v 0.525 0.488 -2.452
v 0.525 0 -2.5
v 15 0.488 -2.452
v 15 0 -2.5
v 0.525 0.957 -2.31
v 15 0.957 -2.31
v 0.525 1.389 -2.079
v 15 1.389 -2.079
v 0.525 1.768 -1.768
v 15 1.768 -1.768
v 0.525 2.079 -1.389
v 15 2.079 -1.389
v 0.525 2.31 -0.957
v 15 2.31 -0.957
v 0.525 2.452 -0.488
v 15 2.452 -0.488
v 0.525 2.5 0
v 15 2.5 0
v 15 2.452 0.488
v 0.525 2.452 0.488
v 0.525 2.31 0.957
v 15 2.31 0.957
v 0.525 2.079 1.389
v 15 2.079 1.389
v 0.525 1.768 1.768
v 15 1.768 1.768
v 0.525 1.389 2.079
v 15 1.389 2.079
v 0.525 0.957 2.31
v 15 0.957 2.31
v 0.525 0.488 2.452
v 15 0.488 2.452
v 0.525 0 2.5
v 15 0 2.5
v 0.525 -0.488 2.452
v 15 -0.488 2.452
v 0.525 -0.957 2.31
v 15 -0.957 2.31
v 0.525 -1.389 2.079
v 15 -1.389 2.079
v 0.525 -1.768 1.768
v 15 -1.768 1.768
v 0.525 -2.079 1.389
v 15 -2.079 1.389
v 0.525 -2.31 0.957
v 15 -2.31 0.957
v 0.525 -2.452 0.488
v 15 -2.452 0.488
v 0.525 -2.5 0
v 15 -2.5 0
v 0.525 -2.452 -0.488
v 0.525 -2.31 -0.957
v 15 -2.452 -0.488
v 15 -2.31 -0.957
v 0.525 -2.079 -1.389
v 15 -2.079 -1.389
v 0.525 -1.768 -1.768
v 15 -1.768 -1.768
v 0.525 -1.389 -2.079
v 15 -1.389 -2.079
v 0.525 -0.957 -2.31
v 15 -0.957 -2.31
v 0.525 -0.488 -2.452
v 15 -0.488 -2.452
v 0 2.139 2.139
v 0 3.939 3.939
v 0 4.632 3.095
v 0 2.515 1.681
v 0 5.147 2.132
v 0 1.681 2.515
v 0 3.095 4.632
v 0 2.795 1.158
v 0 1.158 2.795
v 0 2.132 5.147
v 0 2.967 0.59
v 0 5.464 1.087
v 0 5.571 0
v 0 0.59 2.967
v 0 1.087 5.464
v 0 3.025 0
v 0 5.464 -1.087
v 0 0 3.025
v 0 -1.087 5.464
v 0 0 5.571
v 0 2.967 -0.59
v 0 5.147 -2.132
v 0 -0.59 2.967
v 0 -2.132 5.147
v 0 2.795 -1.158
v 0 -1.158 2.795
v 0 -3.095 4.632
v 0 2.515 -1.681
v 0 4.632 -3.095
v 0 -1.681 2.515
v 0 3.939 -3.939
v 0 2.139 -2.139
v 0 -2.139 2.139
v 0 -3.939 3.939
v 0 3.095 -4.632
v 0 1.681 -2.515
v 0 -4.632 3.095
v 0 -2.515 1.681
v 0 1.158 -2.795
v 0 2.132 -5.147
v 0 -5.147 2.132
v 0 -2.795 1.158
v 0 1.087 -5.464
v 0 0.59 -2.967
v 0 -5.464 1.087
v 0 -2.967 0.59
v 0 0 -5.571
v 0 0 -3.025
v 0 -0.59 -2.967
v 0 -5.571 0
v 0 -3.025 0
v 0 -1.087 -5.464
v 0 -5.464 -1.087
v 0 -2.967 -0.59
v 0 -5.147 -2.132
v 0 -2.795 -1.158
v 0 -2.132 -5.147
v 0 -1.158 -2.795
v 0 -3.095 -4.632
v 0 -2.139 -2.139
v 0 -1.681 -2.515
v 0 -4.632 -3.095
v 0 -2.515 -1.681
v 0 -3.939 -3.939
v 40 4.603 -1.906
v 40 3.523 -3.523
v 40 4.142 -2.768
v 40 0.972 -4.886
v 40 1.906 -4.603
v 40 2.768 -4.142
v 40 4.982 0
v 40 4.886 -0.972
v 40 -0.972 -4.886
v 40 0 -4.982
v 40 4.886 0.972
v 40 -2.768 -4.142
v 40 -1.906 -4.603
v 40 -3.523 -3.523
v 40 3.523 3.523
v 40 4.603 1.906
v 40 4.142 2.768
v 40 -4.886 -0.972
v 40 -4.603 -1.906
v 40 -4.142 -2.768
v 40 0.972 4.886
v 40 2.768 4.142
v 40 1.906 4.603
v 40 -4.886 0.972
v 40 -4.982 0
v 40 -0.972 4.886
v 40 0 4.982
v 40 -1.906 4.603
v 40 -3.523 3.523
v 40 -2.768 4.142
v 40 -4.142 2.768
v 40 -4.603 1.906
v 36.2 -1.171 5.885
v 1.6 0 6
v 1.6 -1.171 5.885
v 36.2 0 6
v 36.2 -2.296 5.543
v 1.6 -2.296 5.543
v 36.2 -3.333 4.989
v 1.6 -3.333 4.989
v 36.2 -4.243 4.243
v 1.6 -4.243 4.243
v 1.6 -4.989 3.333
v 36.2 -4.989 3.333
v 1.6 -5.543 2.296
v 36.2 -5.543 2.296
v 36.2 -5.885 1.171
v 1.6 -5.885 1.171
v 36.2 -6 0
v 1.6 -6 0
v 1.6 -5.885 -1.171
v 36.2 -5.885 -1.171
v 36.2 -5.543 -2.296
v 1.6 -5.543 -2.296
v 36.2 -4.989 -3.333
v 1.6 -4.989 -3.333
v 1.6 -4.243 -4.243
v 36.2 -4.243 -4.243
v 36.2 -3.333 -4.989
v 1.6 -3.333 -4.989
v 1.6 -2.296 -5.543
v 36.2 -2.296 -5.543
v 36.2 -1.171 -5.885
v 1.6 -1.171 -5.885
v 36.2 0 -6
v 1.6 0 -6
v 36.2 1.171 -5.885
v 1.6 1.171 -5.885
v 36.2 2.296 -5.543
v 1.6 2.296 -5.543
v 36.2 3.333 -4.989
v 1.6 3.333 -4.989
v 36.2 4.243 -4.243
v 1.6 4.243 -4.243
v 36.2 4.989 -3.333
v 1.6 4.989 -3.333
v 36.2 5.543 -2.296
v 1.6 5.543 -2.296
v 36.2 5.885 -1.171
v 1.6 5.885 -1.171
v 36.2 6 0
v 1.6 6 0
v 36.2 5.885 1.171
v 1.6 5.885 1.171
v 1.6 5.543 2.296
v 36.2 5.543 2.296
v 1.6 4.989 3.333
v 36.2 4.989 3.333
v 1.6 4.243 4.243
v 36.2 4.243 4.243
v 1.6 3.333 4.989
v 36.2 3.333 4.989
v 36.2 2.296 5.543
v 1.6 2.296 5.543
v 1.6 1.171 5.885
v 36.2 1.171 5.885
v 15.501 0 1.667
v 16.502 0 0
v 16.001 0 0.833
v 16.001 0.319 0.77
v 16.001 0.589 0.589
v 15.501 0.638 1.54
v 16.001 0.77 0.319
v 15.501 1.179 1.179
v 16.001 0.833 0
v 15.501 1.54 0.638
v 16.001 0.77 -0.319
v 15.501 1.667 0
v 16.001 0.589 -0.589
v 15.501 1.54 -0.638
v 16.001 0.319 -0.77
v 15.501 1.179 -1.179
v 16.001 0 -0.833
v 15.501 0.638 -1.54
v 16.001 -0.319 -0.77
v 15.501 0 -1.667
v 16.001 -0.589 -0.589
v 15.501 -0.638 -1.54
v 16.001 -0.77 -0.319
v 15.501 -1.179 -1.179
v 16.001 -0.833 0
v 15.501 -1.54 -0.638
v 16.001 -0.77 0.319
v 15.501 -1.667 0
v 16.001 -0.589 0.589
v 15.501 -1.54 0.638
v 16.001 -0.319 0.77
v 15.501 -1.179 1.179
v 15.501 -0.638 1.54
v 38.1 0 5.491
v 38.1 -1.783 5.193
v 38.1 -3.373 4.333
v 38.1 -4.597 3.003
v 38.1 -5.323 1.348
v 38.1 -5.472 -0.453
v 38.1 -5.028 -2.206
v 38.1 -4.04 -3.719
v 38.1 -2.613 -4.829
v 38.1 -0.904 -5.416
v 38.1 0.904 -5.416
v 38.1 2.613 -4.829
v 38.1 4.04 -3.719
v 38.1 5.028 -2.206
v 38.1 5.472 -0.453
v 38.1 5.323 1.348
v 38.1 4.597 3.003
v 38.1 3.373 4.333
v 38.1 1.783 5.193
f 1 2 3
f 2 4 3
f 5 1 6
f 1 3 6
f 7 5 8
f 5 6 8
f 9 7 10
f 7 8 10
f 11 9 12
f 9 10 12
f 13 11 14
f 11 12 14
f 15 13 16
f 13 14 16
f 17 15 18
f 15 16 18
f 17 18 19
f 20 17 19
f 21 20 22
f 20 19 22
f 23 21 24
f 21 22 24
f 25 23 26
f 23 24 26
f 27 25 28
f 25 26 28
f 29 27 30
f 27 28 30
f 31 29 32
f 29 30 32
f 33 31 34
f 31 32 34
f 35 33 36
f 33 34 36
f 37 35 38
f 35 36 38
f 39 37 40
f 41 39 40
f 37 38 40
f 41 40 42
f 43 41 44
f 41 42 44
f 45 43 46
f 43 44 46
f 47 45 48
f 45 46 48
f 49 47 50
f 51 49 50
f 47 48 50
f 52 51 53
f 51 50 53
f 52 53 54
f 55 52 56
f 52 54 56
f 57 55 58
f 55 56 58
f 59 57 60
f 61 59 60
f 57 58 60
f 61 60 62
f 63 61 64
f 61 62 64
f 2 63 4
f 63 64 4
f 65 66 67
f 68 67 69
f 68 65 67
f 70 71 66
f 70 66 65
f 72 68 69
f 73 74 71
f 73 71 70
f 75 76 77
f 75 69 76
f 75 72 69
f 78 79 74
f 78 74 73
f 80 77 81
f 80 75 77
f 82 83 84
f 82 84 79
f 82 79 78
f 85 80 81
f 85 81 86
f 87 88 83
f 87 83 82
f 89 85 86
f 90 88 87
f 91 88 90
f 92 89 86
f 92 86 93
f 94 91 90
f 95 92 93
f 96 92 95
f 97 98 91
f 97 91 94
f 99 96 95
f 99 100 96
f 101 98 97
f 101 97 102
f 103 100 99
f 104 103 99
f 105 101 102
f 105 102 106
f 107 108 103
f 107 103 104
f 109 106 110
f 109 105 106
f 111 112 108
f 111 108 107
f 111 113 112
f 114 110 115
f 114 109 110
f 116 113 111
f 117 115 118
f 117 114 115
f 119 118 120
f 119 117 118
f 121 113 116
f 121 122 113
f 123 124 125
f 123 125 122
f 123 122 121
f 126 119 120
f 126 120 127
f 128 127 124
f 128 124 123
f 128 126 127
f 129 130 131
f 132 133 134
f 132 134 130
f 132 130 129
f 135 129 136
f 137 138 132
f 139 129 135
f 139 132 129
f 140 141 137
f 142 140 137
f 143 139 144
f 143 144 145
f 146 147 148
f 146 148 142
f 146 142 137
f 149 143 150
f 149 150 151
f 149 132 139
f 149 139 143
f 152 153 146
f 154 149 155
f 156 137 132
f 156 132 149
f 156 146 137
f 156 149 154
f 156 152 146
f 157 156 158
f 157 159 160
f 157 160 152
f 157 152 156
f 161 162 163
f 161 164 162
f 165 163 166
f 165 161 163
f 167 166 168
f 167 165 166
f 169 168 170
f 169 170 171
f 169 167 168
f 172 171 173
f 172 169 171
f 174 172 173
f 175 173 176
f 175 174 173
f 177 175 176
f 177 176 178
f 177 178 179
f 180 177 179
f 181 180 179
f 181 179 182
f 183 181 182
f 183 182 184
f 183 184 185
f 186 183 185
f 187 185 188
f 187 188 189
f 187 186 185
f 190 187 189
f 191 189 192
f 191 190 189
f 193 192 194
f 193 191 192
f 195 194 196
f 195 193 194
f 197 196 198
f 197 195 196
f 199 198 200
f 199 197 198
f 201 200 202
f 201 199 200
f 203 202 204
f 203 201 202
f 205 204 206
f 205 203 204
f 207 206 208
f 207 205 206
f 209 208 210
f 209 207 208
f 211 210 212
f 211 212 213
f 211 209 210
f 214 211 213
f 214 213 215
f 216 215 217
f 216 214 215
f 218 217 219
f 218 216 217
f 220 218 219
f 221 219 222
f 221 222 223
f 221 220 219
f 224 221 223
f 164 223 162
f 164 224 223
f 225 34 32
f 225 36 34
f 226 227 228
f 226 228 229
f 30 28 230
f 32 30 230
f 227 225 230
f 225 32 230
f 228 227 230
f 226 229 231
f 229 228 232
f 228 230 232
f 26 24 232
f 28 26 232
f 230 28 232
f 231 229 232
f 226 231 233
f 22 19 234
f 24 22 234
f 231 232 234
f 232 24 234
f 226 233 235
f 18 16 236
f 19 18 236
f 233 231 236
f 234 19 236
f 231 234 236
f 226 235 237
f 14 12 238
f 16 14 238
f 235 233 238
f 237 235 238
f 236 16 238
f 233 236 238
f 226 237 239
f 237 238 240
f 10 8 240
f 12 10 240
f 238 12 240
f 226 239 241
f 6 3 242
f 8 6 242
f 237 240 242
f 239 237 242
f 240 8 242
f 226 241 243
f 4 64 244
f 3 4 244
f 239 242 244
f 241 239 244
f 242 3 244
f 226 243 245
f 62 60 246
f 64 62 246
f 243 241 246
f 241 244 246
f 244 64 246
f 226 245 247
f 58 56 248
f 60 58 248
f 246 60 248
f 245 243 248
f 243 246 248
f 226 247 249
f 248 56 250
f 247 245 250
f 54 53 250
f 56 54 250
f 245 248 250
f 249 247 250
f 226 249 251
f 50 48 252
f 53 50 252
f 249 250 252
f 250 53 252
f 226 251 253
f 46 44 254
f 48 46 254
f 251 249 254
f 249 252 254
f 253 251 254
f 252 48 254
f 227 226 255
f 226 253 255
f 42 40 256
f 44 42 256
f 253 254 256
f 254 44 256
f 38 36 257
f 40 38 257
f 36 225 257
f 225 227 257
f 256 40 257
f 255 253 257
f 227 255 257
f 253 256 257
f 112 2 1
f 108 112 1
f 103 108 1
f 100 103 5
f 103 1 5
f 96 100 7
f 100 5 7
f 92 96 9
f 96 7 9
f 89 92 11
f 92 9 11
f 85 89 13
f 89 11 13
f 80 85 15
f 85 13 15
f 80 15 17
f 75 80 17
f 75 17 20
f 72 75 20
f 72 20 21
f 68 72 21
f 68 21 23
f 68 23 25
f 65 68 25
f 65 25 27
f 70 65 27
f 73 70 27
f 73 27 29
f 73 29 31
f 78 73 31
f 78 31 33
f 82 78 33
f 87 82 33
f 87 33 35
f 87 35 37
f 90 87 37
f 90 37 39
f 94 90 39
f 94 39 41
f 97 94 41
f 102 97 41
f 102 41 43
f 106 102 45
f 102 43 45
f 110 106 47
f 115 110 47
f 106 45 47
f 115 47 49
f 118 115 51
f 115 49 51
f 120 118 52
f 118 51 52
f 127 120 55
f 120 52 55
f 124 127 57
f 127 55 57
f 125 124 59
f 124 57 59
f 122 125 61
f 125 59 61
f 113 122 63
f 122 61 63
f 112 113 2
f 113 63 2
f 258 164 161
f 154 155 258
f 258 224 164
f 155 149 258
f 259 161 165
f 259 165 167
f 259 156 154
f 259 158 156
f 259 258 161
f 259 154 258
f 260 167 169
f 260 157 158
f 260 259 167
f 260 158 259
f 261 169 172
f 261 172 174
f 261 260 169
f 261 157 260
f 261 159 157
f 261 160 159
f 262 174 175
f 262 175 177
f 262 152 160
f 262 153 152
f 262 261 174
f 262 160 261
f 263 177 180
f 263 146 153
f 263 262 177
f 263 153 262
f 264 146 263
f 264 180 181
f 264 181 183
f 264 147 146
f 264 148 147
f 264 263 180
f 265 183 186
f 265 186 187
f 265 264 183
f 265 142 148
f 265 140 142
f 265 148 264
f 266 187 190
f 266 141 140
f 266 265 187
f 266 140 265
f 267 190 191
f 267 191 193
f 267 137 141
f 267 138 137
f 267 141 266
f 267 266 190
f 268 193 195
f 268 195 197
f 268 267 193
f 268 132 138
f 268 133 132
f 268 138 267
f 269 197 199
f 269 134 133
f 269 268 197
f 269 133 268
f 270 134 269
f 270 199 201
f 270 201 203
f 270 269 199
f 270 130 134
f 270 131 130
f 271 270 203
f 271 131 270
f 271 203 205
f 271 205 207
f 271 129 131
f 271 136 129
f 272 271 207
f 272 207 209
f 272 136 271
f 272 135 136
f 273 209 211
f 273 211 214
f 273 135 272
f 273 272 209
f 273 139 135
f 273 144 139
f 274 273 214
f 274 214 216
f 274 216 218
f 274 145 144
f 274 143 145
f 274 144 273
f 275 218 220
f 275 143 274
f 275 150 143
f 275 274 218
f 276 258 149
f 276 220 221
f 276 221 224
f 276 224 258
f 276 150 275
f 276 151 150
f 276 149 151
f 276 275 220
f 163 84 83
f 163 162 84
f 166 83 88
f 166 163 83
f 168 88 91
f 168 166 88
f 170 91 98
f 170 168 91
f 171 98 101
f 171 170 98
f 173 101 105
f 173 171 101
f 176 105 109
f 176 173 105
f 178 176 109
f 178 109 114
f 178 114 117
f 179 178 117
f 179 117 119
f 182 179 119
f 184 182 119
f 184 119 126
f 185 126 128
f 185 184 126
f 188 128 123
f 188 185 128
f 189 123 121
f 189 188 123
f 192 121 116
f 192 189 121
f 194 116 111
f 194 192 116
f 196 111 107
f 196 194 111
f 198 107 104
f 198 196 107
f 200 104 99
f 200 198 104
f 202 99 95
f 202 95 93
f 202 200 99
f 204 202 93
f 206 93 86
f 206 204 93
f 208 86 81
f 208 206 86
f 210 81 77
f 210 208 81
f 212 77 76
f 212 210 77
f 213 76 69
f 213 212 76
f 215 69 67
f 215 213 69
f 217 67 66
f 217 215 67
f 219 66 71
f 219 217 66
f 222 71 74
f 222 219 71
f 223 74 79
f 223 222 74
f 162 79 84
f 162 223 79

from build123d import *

# Parameters (mm, degrees)
M6_GEWINDEBOHRUNG1_D           = 5
M6_GEWINDEBOHRUNG1_DEPTH       = 15
M6_GEWINDEBOHRUNG1_CSINK_D     = 6.05
M6_GEWINDEBOHRUNG1_CSINK_ANGLE = 90
M6_GEWINDEBOHRUNG1_TIP         = 1.502151548


with BuildPart() as part:
    # Skizze1 → Rotation3 (revolve)
    with BuildSketch(Plane.XY, mode=Mode.PRIVATE) as rotation3_sk:
        Polygon((0, 0), (0, 5.571281292), (1.6, 6), (36.2, 6), (40, 4.981793069), (40, 0), align=None)
    revolve(rotation3_sk.sketch.rotate(Axis((0, 0, 0), (1, 0, 0)), 90), axis=Axis((0, 0, 0), (1, 0, 0)))

    # M6 Gewindebohrung1
    with Locations(Plane.ZY):
        with Locations((0, 0)):
            CounterSinkHole(M6_GEWINDEBOHRUNG1_D / 2, M6_GEWINDEBOHRUNG1_CSINK_D / 2, depth=M6_GEWINDEBOHRUNG1_DEPTH, counter_sink_angle=M6_GEWINDEBOHRUNG1_CSINK_ANGLE)
            with Locations((0, 0, -(M6_GEWINDEBOHRUNG1_DEPTH + M6_GEWINDEBOHRUNG1_TIP / 2))):  # 118° drill point
                Cone(0, M6_GEWINDEBOHRUNG1_D / 2, M6_GEWINDEBOHRUNG1_TIP, mode=Mode.SUBTRACT)


solid = part.part
